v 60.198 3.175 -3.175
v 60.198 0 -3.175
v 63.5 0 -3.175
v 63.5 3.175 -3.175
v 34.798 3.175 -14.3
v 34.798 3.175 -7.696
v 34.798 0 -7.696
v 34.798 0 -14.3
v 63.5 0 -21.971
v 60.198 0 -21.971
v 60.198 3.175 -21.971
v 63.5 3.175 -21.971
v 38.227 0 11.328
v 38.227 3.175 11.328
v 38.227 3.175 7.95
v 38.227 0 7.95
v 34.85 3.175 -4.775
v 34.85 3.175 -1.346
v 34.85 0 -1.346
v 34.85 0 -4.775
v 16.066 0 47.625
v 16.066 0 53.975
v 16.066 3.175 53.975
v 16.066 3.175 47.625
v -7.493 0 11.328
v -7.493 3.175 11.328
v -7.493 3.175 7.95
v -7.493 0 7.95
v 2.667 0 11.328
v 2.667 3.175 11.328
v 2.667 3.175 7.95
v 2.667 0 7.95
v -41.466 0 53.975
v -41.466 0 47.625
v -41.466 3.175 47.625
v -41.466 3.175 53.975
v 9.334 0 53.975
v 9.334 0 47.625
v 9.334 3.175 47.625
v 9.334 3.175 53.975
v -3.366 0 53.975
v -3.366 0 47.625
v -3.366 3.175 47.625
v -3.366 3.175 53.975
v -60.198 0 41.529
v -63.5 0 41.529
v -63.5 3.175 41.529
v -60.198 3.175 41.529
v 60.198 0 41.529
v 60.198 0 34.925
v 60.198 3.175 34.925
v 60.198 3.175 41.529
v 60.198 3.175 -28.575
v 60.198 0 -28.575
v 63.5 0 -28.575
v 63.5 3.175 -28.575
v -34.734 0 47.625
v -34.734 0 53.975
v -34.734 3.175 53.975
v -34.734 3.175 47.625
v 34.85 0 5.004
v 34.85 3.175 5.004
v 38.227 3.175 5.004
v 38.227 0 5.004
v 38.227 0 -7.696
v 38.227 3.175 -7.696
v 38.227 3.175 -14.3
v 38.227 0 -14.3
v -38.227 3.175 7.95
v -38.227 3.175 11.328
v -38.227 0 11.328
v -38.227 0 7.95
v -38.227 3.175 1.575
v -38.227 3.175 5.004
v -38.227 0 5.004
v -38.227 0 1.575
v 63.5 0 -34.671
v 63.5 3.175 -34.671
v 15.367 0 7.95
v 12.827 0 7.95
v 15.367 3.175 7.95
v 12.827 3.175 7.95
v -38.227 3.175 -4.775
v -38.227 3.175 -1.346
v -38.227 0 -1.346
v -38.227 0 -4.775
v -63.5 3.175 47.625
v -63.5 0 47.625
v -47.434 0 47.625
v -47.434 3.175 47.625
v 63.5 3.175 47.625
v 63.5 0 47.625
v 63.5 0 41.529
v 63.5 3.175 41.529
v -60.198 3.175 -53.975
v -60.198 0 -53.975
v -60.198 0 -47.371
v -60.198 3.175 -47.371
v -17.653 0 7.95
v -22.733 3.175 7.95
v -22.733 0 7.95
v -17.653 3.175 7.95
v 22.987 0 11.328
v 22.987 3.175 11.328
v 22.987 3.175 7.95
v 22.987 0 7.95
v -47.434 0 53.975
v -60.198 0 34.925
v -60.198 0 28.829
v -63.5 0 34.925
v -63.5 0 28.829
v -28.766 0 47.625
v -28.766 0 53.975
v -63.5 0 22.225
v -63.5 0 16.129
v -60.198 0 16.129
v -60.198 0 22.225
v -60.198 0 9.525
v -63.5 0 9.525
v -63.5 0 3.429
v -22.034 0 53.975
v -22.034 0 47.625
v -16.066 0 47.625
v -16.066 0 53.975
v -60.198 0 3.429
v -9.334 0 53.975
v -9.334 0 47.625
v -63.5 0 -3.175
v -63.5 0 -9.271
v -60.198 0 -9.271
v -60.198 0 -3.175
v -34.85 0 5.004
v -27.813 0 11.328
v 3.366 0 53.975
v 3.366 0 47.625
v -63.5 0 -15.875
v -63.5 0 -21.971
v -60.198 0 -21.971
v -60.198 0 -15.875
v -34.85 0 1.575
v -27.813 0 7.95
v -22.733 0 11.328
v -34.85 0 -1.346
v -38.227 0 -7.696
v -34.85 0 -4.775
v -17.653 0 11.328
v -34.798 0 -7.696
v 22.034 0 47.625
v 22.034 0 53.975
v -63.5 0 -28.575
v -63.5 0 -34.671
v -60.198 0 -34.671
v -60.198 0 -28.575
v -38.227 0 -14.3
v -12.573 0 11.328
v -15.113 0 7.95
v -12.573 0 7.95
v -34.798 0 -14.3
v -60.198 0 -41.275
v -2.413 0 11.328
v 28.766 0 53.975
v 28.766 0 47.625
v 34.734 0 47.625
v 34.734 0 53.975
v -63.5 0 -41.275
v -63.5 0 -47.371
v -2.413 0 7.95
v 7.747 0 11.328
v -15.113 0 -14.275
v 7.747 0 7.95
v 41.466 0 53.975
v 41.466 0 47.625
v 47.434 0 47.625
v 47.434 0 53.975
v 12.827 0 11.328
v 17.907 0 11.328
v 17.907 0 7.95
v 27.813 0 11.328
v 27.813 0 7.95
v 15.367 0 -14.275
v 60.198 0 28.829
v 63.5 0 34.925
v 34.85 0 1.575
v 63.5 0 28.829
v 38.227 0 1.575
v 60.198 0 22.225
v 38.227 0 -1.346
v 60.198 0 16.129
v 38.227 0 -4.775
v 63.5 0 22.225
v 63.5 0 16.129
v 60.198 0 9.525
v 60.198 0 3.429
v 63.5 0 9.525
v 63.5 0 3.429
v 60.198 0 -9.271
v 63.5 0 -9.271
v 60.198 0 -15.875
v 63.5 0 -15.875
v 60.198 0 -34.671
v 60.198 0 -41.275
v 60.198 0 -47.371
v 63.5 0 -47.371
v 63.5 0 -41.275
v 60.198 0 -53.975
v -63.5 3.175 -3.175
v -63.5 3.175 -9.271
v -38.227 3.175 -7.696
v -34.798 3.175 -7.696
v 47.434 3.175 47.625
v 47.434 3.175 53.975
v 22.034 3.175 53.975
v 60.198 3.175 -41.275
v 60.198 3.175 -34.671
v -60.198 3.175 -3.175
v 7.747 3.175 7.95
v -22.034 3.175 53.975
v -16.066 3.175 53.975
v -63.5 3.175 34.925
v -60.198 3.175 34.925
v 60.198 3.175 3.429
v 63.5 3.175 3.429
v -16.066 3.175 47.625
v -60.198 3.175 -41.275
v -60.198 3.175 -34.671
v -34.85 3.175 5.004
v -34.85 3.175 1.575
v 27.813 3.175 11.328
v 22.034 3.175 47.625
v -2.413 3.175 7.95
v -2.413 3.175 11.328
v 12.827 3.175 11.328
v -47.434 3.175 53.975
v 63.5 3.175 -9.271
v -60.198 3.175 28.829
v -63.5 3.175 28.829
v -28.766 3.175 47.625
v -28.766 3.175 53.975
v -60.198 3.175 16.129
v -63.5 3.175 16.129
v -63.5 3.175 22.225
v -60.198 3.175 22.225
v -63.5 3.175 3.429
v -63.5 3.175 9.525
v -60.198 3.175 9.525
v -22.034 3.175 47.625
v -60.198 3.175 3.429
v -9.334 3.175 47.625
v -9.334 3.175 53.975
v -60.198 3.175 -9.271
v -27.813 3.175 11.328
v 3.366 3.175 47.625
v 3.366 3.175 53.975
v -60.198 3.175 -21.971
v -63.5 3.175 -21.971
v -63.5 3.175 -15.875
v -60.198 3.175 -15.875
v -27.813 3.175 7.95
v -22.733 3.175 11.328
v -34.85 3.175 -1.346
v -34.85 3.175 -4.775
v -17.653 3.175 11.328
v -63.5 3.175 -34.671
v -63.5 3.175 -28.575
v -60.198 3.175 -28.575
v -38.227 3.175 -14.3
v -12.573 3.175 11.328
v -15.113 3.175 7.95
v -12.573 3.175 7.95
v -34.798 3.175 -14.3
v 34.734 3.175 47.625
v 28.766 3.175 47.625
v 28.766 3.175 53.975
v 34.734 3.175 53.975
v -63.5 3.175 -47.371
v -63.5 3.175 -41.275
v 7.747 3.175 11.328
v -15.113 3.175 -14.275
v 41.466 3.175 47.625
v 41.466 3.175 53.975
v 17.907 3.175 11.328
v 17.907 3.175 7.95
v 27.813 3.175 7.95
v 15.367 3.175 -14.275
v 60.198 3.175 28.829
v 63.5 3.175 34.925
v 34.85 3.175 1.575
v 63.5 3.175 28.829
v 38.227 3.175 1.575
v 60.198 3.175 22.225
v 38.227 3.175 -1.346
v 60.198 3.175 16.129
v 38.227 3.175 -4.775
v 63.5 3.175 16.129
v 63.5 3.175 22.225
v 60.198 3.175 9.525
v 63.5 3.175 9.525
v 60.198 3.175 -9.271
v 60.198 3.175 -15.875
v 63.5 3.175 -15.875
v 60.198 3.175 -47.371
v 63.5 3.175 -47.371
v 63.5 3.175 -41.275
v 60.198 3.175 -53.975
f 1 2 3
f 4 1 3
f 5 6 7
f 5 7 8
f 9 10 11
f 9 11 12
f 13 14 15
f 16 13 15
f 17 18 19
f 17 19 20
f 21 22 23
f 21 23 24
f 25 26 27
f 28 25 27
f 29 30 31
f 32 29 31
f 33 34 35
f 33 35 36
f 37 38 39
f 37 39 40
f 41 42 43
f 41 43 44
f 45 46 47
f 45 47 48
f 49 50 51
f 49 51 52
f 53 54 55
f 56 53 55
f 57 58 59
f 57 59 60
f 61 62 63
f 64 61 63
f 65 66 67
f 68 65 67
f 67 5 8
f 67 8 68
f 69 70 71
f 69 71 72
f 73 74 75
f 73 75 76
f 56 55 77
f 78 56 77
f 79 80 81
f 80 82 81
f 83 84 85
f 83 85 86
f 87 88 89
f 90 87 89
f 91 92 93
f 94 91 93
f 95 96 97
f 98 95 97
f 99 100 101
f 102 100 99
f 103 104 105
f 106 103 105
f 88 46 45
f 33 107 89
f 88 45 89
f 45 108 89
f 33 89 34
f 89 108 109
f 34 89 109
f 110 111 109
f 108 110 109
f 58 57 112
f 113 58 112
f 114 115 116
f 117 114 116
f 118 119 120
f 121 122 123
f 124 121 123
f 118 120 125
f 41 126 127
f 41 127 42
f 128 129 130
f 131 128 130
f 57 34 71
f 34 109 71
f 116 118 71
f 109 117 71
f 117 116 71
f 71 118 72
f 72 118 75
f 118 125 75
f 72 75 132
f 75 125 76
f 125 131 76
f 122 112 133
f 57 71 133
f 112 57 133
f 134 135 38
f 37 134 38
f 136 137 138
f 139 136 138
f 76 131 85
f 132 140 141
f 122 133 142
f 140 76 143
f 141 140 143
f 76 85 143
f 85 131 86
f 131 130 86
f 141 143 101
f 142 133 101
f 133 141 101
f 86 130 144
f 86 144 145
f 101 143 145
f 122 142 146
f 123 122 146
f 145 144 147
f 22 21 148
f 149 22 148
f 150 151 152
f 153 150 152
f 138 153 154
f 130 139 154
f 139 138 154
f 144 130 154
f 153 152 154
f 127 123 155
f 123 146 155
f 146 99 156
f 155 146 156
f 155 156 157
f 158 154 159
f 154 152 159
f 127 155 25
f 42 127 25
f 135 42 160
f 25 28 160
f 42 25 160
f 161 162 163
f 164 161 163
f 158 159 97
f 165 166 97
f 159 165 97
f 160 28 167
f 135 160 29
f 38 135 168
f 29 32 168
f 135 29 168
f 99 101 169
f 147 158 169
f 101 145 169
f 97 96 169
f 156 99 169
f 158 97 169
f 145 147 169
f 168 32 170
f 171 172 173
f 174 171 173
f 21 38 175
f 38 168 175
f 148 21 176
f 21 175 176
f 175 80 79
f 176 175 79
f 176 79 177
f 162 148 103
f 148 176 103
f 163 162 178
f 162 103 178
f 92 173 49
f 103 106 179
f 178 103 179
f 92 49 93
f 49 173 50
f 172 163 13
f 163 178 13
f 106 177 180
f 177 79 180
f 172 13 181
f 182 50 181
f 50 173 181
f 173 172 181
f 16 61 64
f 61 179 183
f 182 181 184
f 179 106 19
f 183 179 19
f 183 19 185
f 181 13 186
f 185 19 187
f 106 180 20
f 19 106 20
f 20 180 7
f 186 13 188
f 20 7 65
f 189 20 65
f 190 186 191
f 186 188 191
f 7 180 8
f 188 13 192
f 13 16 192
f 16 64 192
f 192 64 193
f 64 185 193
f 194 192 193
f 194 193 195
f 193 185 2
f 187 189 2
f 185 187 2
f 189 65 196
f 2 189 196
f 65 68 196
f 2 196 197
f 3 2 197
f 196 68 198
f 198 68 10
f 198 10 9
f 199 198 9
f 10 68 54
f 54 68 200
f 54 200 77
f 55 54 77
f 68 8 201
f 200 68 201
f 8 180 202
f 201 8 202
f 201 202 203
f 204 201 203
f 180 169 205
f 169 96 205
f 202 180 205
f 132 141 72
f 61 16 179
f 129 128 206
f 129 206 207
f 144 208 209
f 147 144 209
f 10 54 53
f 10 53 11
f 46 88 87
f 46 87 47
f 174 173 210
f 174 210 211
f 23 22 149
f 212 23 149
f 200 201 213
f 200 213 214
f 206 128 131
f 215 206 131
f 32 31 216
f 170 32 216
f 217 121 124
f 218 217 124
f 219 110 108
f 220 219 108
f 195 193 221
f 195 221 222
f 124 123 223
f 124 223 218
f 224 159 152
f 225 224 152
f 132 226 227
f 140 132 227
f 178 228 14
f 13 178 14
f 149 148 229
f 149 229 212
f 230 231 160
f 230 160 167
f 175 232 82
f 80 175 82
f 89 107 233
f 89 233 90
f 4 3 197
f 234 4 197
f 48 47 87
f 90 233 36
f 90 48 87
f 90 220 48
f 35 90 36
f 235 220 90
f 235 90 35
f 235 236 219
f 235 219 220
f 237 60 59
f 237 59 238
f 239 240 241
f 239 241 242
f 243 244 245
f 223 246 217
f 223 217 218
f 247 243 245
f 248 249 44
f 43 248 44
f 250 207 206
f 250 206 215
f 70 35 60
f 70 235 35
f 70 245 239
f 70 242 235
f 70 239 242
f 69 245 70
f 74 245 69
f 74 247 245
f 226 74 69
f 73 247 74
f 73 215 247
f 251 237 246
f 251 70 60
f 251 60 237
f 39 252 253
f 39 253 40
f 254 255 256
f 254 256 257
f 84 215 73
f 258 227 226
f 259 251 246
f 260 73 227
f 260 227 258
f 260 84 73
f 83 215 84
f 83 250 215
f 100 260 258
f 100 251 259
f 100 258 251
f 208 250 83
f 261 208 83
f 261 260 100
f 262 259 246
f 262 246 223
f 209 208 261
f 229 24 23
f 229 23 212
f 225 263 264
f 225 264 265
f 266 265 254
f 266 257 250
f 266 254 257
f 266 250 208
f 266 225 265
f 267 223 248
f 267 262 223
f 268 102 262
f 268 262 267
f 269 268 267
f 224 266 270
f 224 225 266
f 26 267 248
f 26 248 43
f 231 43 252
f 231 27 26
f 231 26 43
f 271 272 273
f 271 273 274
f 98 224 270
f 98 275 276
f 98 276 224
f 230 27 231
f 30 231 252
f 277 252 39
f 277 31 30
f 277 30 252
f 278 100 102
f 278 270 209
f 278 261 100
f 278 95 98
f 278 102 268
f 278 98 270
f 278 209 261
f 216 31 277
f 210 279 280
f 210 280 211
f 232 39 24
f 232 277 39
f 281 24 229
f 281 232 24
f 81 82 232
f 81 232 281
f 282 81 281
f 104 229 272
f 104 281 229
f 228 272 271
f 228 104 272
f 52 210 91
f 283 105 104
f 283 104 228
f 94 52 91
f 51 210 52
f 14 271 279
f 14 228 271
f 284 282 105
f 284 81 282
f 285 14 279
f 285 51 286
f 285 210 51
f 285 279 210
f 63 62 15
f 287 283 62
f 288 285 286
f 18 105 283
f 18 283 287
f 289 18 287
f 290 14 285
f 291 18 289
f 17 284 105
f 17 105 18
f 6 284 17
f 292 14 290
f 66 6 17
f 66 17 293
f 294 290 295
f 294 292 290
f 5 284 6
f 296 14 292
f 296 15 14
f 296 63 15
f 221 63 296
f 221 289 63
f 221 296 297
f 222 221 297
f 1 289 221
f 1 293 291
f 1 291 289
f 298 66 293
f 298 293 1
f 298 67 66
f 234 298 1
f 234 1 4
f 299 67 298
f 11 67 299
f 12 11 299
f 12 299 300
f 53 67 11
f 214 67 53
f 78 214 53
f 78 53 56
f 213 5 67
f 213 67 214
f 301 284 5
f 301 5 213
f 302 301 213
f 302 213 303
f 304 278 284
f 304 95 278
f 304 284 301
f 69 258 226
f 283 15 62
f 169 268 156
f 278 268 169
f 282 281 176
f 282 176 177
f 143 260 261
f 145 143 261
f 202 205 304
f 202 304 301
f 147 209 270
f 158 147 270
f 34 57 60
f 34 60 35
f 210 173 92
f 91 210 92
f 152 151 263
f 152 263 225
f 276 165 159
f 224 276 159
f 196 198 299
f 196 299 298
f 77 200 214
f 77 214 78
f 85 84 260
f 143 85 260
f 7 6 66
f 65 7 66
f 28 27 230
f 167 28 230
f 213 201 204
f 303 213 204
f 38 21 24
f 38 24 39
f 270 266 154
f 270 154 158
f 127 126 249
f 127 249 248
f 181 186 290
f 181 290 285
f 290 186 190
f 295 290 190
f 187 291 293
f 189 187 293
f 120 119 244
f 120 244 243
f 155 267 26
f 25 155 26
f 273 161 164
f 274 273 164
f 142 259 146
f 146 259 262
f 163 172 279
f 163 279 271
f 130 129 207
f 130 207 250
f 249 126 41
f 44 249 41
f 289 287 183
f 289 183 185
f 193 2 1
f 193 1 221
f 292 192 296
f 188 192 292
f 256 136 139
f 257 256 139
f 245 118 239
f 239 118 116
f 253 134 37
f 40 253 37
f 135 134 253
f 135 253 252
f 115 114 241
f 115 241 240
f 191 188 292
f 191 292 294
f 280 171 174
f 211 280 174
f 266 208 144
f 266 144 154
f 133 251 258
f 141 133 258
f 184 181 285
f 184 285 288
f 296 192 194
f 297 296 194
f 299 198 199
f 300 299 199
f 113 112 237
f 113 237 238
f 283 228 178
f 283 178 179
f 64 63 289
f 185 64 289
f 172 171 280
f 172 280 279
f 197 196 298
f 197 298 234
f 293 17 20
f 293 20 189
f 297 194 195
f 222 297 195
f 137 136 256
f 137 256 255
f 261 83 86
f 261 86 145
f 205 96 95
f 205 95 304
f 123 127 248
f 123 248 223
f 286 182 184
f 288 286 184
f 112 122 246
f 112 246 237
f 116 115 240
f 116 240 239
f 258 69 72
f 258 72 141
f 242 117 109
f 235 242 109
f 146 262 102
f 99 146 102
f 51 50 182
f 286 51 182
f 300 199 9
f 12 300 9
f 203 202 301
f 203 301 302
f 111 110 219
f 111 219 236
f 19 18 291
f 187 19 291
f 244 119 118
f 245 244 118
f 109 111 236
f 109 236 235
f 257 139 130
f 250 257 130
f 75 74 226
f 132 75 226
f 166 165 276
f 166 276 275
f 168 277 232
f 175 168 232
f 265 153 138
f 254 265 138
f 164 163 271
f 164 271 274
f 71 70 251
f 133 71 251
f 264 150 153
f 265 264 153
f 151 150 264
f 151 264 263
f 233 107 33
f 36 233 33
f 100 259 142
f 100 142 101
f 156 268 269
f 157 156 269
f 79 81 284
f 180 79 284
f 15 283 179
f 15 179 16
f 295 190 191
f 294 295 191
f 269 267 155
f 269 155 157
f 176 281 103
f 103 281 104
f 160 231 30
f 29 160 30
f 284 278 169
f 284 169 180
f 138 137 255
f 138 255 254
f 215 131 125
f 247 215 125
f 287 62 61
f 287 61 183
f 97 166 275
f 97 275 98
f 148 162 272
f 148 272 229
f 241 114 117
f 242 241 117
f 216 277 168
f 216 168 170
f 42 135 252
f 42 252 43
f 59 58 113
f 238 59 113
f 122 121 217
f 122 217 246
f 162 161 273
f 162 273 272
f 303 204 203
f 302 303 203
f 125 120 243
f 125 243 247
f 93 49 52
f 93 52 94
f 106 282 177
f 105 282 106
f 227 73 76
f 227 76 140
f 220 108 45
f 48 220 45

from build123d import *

# Parameters (mm, degrees)
SKETCH1_W           = 127
SKETCH1_H           = 107.95
BOSS_EXTRUDE1_DEPTH = 3.175
SKETCH2_W           = 3.302
SKETCH2_H           = 6.604
CUT_EXTRUDE1_DEPTH  = 84.400427157
SKETCH3_R           = 1.27
SKETCH3_W           = 3.377042817
SKETCH3_H           = 3.429
SKETCH3_W_2         = 3.429
SKETCH3_H_2         = 6.604
SKETCH3_W_3         = 5.08
SKETCH3_H_3         = 3.377042817
SKETCH3_W_4         = 10.414
CUT_EXTRUDE2_DEPTH  = 84.400427157
SKETCH4_W           = 25.4
SKETCH4_H           = 12.7
CUT_EXTRUDE3_DEPTH  = 84.400427157
SKETCH5_W           = 30.48
SKETCH5_H           = 17.475489296
CUT_EXTRUDE4_DEPTH  = 84.400427157
SKETCH6_W           = 30.48
SKETCH6_H           = 22.225
CUT_EXTRUDE5_DEPTH  = 84.400427157


with BuildPart() as part:
    # Sketch1 → Boss-Extrude1 (new body)
    with BuildSketch(Plane(origin=(0, 0, 0), x_dir=(1, 0, 0), z_dir=(0, 1, 0))):
        Rectangle(SKETCH1_W, SKETCH1_H)
    extrude(amount=BOSS_EXTRUDE1_DEPTH)

    # Sketch2 → Cut-Extrude1 (cut, through all)
    with BuildSketch(Plane.XZ):
        Polygon((-34.7345, 47.625), (-41.4655, 47.625), (-41.4655, 54.229), (-47.4345, 54.229), (-47.4345, 47.625), (-60.198, 47.625), (-63.5, 47.625), (-63.5, 54.229), (-63.5, 63.03162391), (63.5, 63.03162391), (63.5, 54.229), (63.5, 47.625), (60.198, 47.625), (47.4345, 47.625), (47.4345, 54.229), (41.4655, 54.229), (41.4655, 47.625), (34.7345, 47.625), (34.7345, 54.229), (28.7655, 54.229), (28.7655, 47.625), (22.0345, 47.625), (22.0345, 54.229), (16.0655, 54.229), (16.0655, 47.625), (9.3345, 47.625), (9.3345, 54.229), (3.3655, 54.229), (3.3655, 47.625), (-3.3655, 47.625), (-3.3655, 54.229), (-9.3345, 54.229), (-9.3345, 47.625), (-16.0655, 47.625), (-16.0655, 54.229), (-22.0345, 54.229), (-22.0345, 47.625), (-28.7655, 47.625), (-28.7655, 54.229), (-34.7345, 54.229), align=None)
        with Locations((61.849, 38.227)):
            Rectangle(SKETCH2_W, SKETCH2_H)
        with Locations((61.849, 25.527)):
            Rectangle(SKETCH2_W, SKETCH2_H)
        with Locations((61.849, 12.827)):
            Rectangle(SKETCH2_W, SKETCH2_H)
        with Locations((61.849, 0.127)):
            Rectangle(SKETCH2_W, SKETCH2_H)
        with Locations((61.849, -12.573)):
            Rectangle(SKETCH2_W, SKETCH2_H)
        with Locations((61.849, -25.273)):
            Rectangle(SKETCH2_W, SKETCH2_H)
        with Locations((61.849, -37.973)):
            Rectangle(SKETCH2_W, SKETCH2_H)
        with Locations((-61.849, -37.973)):
            Rectangle(SKETCH2_W, SKETCH2_H)
        with Locations((-61.849, -25.273)):
            Rectangle(SKETCH2_W, SKETCH2_H)
        with Locations((-61.849, -12.573)):
            Rectangle(SKETCH2_W, SKETCH2_H)
        with Locations((-61.849, 0.127)):
            Rectangle(SKETCH2_W, SKETCH2_H)
        with Locations((-61.849, 12.827)):
            Rectangle(SKETCH2_W, SKETCH2_H)
        with Locations((-61.849, 25.527)):
            Rectangle(SKETCH2_W, SKETCH2_H)
        with Locations((-61.849, 38.227)):
            Rectangle(SKETCH2_W, SKETCH2_H)
        with Locations((61.849, -50.673)):
            Rectangle(SKETCH2_W, SKETCH2_H)
        with Locations((-61.849, -50.673)):
            Rectangle(SKETCH2_W, SKETCH2_H)
    extrude(amount=-CUT_EXTRUDE1_DEPTH, mode=Mode.SUBTRACT)

    # Sketch3 → Cut-Extrude2 (cut, through all)
    with BuildSketch(Plane(origin=(0, 3.175, 0), x_dir=(1, 0, 0), z_dir=(0, 1, 0))):
        with Locations((0, 3.175)):
            Circle(SKETCH3_R)
        with Locations((-36.538478592, -3.289010704)):
            Rectangle(SKETCH3_W, SKETCH3_H)
        with Locations((-36.5125, 10.998489296)):
            Rectangle(SKETCH3_W_2, SKETCH3_H_2)
        with Locations((-36.538478592, 3.060989296)):
            Rectangle(SKETCH3_W, SKETCH3_H)
        with Locations((-10.033, -9.639010705)):
            Rectangle(SKETCH3_W_3, SKETCH3_H_3)
        with Locations((-33.02, -9.639010705)):
            Rectangle(SKETCH3_W_4, SKETCH3_H_3)
        with Locations((-20.193, -9.639010705)):
            Rectangle(SKETCH3_W_3, SKETCH3_H_3)
        with Locations((0.127, -9.639010705)):
            Rectangle(SKETCH3_W_3, SKETCH3_H_3)
        with Locations((10.287, -9.639010705)):
            Rectangle(SKETCH3_W_3, SKETCH3_H_3)
        with Locations((20.447, -9.639010705)):
            Rectangle(SKETCH3_W_3, SKETCH3_H_3)
        with Locations((33.02, -9.639010705)):
            Rectangle(SKETCH3_W_4, SKETCH3_H_3)
        with Locations((36.538478592, -3.289010704)):
            Rectangle(SKETCH3_W, SKETCH3_H)
        with Locations((36.538478592, 3.060989296)):
            Rectangle(SKETCH3_W, SKETCH3_H)
        with Locations((36.5125, 10.998489296)):
            Rectangle(SKETCH3_W_2, SKETCH3_H_2)
    extrude(amount=-CUT_EXTRUDE2_DEPTH, mode=Mode.SUBTRACT)

    # Sketch4 → Cut-Extrude3 (cut, through all)
    with BuildSketch(Plane(origin=(0, 3.175, 0), x_dir=(1, 0, 0), z_dir=(0, 1, 0))):
        with Locations((0, 3.175)):
            Rectangle(SKETCH4_W, SKETCH4_H)
    extrude(amount=-CUT_EXTRUDE3_DEPTH, mode=Mode.SUBTRACT)

    # Sketch5 → Cut-Extrude4 (cut, through all)
    with BuildSketch(Plane(origin=(0, 3.175, 0), x_dir=(1, 0, 0), z_dir=(0, 1, 0))):
        with Locations((0.127, 0.787255352)):
            Rectangle(SKETCH5_W, SKETCH5_H)
    extrude(amount=-CUT_EXTRUDE4_DEPTH, mode=Mode.SUBTRACT)

    # Sketch6 → Cut-Extrude5 (cut, through all)
    with BuildSketch(Plane(origin=(0, 3.175, 0), x_dir=(1, 0, 0), z_dir=(0, 1, 0))):
        with Locations((0.127, 3.162010704)):
            Rectangle(SKETCH6_W, SKETCH6_H)
    extrude(amount=-CUT_EXTRUDE5_DEPTH, mode=Mode.SUBTRACT)


solid = part.part
